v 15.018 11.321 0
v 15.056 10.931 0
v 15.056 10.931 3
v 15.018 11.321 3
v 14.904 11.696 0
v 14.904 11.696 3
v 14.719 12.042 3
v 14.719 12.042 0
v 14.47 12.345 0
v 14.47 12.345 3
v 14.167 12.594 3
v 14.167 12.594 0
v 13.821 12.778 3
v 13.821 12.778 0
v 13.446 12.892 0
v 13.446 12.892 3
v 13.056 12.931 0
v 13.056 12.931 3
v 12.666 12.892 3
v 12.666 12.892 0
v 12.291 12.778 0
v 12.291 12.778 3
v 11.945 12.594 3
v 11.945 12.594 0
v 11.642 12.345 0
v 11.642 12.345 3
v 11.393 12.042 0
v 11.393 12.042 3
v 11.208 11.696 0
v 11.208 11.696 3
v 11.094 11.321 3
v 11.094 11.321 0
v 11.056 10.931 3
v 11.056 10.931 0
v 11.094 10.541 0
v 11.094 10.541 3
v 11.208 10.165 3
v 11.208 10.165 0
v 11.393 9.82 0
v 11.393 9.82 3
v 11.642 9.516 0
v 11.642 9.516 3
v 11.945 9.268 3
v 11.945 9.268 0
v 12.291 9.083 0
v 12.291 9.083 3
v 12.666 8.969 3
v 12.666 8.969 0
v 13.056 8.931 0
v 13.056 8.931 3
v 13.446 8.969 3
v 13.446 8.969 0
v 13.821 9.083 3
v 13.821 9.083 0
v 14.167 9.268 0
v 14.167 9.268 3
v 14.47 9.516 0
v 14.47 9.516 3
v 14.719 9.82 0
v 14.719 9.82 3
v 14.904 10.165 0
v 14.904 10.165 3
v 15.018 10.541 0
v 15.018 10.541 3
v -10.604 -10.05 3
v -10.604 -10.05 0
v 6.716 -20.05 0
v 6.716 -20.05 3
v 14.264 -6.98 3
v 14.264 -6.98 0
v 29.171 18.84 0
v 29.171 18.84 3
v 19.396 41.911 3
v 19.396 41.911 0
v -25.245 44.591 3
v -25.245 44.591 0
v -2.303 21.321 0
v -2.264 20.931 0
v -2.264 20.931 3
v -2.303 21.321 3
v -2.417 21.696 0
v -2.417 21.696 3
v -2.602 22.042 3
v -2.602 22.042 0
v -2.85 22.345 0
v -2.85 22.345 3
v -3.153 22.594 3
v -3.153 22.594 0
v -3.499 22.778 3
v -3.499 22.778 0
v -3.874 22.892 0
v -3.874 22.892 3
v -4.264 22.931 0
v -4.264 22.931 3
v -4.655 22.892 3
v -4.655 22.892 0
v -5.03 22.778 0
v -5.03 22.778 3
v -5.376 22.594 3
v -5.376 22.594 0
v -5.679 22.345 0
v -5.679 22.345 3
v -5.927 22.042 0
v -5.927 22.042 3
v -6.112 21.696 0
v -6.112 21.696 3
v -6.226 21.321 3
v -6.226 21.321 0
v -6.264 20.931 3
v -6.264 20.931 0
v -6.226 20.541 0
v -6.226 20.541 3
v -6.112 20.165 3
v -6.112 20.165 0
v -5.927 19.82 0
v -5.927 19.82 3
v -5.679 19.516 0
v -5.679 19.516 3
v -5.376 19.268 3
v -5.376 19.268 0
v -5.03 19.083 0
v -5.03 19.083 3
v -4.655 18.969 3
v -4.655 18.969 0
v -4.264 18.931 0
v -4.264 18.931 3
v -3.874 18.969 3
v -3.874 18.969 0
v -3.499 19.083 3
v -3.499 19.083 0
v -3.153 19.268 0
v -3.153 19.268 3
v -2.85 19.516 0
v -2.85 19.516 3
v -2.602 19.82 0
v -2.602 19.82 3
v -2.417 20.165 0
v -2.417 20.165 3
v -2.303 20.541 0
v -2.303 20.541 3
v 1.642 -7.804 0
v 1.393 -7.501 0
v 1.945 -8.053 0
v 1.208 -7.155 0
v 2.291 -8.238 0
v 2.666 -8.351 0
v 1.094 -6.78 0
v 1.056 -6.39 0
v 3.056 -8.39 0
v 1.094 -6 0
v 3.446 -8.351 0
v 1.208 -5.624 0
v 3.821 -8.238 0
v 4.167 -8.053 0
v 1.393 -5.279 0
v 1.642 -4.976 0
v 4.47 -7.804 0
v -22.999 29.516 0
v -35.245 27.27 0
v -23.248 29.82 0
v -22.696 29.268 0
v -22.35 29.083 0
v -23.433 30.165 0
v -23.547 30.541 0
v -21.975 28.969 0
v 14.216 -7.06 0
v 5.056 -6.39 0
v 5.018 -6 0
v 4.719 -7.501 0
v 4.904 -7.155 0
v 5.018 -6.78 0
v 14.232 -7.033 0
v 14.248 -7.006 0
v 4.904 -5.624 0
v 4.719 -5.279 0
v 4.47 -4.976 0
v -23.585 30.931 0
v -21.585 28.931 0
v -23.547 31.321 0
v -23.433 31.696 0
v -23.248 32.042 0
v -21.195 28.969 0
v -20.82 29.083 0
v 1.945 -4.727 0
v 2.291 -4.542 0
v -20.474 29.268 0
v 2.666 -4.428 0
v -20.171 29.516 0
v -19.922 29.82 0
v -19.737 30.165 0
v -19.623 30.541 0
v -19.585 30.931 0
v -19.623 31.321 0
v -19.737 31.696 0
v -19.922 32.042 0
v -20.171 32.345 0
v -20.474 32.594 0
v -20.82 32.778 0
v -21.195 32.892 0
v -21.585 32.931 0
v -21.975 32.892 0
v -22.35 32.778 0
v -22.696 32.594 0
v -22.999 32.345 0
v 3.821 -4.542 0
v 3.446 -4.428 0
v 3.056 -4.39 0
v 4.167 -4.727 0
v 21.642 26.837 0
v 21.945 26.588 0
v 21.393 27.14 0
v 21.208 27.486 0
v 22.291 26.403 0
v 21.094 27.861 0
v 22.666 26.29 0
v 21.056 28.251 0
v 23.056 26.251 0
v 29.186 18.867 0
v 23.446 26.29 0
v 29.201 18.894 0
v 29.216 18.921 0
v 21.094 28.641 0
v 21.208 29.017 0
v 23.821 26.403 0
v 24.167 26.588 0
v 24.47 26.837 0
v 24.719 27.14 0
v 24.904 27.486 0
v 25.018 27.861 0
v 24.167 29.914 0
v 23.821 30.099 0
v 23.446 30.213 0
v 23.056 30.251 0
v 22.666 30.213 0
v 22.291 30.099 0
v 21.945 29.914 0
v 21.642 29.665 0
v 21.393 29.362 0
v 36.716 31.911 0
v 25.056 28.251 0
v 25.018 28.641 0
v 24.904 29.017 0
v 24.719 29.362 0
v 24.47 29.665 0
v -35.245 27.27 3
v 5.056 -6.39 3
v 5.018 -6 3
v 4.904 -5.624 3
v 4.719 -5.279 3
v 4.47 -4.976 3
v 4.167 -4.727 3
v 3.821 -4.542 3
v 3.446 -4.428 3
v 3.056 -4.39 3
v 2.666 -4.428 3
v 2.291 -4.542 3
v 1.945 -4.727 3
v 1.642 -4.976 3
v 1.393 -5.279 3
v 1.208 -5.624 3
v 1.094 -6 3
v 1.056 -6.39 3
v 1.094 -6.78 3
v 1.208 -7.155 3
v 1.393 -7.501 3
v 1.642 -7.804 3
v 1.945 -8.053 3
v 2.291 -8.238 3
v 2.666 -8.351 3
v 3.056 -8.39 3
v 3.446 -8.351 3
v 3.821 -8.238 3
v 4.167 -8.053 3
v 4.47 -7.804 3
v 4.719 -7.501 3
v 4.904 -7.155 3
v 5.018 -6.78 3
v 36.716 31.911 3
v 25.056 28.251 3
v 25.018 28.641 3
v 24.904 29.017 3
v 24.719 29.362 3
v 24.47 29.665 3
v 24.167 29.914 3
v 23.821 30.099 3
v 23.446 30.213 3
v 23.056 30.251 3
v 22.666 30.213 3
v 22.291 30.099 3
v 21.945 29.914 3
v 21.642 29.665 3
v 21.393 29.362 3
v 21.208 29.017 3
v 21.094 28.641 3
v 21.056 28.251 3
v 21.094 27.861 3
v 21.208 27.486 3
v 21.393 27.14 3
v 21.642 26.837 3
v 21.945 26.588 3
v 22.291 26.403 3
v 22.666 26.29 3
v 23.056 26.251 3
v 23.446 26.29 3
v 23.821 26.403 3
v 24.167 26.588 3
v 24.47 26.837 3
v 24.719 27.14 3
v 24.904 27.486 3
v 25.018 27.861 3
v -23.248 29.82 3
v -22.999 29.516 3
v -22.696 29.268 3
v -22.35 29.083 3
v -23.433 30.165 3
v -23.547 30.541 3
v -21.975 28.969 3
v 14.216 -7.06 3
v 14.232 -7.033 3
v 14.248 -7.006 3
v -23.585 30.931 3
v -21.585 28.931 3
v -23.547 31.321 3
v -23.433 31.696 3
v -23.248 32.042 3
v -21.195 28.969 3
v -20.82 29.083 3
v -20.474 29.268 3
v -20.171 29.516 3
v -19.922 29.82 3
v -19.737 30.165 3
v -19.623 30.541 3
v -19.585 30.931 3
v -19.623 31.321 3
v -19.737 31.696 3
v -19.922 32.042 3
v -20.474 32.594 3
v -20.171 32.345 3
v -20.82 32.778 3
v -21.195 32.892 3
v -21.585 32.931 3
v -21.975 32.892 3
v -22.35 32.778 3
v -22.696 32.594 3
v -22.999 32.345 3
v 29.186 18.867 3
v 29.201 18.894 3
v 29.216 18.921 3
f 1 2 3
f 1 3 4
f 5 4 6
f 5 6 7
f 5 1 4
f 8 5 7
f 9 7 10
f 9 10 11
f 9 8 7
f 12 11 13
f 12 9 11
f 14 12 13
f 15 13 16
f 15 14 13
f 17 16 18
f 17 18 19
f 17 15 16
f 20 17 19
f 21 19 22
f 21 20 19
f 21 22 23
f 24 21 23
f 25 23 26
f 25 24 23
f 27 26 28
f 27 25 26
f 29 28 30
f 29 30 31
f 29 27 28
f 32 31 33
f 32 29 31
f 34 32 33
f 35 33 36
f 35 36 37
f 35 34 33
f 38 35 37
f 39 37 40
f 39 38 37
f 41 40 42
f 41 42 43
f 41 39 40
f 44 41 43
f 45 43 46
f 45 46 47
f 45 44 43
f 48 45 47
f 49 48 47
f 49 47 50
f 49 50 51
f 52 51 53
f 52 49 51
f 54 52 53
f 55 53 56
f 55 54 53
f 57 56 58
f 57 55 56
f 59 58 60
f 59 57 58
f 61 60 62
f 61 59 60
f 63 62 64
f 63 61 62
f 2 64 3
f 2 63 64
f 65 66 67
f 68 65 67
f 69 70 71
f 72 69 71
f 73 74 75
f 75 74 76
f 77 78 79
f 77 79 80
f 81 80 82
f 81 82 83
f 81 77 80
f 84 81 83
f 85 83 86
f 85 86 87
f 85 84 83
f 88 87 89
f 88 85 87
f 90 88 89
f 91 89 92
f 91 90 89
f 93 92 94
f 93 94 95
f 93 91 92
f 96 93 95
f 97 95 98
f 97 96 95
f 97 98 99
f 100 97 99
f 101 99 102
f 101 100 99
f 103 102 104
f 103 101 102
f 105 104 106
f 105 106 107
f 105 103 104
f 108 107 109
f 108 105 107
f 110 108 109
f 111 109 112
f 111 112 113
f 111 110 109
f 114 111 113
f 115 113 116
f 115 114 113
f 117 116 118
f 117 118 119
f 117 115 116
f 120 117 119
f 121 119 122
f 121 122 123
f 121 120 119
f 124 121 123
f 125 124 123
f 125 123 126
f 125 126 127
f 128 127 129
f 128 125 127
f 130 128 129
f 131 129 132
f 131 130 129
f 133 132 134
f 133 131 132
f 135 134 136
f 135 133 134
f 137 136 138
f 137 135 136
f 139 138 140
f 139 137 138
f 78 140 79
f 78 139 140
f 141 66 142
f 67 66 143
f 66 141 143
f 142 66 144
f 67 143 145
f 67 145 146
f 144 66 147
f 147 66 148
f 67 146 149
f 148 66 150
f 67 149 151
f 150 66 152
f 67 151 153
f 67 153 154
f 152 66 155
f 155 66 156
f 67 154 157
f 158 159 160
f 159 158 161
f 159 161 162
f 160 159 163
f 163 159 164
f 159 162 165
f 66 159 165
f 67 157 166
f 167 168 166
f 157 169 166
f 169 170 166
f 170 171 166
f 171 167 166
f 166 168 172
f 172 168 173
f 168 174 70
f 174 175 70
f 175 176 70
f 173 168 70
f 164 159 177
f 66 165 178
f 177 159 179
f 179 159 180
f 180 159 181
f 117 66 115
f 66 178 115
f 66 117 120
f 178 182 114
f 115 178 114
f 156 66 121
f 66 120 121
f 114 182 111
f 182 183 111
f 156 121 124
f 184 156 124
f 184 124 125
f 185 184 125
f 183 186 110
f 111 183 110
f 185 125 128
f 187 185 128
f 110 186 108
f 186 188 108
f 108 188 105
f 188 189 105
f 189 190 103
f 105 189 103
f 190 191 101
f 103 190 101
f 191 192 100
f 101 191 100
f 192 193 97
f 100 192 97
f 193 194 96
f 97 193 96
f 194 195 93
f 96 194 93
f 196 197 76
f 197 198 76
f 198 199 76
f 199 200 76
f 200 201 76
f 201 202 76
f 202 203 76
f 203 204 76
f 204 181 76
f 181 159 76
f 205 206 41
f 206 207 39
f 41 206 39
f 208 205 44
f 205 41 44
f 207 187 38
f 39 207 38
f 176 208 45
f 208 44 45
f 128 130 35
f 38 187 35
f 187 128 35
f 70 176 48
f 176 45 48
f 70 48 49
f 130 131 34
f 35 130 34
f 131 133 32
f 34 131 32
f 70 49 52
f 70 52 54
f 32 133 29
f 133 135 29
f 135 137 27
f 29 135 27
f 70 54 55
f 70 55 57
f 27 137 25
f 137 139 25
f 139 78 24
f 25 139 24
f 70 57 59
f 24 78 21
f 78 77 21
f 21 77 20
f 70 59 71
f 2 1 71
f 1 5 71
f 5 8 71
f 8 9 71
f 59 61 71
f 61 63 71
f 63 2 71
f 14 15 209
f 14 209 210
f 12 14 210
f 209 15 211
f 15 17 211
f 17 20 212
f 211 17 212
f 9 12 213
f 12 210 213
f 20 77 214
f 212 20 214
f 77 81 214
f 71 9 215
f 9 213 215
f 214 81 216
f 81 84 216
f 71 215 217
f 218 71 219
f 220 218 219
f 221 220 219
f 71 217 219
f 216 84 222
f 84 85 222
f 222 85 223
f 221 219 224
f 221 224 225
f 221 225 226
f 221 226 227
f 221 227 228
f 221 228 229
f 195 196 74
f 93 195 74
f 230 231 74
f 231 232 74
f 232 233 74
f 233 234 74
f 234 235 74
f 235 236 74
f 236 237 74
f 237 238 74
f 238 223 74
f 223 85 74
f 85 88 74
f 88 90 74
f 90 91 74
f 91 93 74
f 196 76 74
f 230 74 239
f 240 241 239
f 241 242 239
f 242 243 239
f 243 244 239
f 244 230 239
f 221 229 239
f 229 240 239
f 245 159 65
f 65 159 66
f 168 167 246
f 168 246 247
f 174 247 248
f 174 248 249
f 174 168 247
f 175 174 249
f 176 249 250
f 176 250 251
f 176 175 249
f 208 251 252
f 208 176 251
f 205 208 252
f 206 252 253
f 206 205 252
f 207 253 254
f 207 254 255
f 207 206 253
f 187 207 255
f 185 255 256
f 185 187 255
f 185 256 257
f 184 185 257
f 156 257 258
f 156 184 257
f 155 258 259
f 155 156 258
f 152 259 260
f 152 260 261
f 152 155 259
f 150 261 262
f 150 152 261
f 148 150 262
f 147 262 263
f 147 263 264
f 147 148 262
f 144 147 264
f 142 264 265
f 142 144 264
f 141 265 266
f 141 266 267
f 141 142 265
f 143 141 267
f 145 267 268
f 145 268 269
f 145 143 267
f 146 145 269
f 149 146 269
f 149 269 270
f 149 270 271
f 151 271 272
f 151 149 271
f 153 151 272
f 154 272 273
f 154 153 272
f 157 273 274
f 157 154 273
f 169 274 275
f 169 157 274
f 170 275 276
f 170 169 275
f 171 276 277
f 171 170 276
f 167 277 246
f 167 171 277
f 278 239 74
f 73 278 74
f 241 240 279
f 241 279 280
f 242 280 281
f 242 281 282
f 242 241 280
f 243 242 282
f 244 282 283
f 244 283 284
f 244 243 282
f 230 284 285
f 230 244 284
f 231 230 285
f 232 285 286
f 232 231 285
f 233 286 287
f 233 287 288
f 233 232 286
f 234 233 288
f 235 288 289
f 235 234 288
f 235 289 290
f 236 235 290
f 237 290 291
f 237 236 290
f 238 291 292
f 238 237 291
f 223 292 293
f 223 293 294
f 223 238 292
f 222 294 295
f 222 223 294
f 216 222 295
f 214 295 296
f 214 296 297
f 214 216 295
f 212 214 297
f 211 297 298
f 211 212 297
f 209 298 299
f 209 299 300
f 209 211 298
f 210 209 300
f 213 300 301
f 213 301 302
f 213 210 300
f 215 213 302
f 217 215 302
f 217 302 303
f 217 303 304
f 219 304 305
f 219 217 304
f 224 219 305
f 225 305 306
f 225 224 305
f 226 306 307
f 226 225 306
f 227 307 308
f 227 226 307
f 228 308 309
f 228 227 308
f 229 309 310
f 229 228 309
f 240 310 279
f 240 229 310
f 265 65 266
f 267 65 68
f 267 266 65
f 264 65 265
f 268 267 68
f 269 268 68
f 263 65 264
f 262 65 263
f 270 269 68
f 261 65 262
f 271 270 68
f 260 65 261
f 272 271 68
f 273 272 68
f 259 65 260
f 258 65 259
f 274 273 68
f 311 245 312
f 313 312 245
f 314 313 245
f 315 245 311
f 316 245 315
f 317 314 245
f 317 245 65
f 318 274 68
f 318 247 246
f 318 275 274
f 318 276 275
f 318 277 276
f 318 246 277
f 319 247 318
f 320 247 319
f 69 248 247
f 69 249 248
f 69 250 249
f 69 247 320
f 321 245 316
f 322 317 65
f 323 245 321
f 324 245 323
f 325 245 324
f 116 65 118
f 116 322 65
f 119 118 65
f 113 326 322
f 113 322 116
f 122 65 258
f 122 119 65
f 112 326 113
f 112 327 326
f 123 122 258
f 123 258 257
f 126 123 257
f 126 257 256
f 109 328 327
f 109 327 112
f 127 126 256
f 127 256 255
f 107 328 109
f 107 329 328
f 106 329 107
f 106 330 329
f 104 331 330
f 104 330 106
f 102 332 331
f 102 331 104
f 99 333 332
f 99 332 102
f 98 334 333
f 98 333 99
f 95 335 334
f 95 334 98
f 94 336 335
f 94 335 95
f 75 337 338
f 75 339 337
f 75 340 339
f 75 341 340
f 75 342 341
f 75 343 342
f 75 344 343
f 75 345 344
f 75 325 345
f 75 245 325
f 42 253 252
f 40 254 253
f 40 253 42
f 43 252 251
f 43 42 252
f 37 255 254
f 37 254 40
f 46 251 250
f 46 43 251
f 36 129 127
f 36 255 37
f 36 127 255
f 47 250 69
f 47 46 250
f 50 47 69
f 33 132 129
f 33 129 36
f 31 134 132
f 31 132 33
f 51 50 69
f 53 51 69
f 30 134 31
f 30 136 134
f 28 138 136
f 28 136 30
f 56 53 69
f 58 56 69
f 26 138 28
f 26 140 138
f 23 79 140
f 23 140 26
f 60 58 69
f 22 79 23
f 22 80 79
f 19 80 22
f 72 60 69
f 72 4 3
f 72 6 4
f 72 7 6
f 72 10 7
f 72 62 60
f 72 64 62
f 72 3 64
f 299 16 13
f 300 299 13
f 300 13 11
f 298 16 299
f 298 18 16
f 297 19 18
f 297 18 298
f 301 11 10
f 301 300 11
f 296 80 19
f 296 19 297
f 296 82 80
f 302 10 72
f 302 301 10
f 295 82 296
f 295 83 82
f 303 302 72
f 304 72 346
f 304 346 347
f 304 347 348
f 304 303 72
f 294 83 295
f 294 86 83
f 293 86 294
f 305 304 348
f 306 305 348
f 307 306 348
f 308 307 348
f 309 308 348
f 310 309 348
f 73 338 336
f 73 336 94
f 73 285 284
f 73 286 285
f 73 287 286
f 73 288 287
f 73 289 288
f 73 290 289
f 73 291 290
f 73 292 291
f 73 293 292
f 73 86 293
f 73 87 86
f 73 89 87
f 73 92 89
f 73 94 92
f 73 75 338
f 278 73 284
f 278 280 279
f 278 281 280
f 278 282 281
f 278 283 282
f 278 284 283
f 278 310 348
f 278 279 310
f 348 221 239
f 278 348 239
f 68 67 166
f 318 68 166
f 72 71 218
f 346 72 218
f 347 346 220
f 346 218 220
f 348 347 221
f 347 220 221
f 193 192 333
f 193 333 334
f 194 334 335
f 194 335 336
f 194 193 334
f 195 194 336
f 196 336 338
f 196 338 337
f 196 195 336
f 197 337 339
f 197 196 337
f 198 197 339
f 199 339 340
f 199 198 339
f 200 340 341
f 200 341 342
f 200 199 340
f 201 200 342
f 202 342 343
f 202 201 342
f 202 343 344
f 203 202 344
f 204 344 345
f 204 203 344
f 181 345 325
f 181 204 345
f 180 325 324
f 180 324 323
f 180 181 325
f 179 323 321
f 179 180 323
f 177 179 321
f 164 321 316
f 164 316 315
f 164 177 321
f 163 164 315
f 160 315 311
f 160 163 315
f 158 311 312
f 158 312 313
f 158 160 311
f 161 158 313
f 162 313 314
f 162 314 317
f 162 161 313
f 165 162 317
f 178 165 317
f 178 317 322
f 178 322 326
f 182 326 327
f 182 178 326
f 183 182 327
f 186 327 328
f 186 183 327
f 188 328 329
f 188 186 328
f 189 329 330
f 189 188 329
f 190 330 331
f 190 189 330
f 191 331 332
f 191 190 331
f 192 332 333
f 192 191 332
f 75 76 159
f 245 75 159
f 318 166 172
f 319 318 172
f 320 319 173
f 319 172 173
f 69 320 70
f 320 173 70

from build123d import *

# Parameters (mm, degrees)
SKETCH_1_R      = 2
EXTRUDE_1_DEPTH = 3


with BuildPart() as part:
    # 草图1 → 凸台-拉伸1 (new body)
    with BuildSketch(Plane.XY):
        with BuildLine():
            Line((14.263569054, -6.979512092), (29.170512591, 18.8400715))
            ThreePointArc((29.170512591, 18.8400715), (29.193213203, 18.880689143), (29.216290822, 18.921093774))
            Line((29.216290822, 18.921093774), (36.716290822, 31.91147483))
            Line((36.716290822, 31.91147483), (19.395782747, 41.91147483))
            Line((19.395782747, 41.91147483), (-25.245233405, 44.590966755))
            Line((-25.245233405, 44.590966755), (-35.245233405, 27.270458679))
            Line((-35.245233405, 27.270458679), (-10.604217253, -10.050049397))
            Line((-10.604217253, -10.050049397), (6.716290822, -20.050049397))
            Line((6.716290822, -20.050049397), (14.216290822, -7.05966834))
            ThreePointArc((14.216290822, -7.05966834), (14.23974345, -7.01948022), (14.263569054, -6.979512092))
        make_face()
        with Locations((-21.584979367, 30.930712717)):
            Circle(SKETCH_1_R, mode=Mode.SUBTRACT)
        with Locations((3.056036785, -6.389795359)):
            Circle(SKETCH_1_R, mode=Mode.SUBTRACT)
        with Locations((13.056036785, 10.930712717)):
            Circle(SKETCH_1_R, mode=Mode.SUBTRACT)
        with Locations((23.056036785, 28.251220792)):
            Circle(SKETCH_1_R, mode=Mode.SUBTRACT)
        with Locations((-4.264471291, 20.930712717)):
            Circle(SKETCH_1_R, mode=Mode.SUBTRACT)
    extrude(amount=EXTRUDE_1_DEPTH)


solid = part.part
